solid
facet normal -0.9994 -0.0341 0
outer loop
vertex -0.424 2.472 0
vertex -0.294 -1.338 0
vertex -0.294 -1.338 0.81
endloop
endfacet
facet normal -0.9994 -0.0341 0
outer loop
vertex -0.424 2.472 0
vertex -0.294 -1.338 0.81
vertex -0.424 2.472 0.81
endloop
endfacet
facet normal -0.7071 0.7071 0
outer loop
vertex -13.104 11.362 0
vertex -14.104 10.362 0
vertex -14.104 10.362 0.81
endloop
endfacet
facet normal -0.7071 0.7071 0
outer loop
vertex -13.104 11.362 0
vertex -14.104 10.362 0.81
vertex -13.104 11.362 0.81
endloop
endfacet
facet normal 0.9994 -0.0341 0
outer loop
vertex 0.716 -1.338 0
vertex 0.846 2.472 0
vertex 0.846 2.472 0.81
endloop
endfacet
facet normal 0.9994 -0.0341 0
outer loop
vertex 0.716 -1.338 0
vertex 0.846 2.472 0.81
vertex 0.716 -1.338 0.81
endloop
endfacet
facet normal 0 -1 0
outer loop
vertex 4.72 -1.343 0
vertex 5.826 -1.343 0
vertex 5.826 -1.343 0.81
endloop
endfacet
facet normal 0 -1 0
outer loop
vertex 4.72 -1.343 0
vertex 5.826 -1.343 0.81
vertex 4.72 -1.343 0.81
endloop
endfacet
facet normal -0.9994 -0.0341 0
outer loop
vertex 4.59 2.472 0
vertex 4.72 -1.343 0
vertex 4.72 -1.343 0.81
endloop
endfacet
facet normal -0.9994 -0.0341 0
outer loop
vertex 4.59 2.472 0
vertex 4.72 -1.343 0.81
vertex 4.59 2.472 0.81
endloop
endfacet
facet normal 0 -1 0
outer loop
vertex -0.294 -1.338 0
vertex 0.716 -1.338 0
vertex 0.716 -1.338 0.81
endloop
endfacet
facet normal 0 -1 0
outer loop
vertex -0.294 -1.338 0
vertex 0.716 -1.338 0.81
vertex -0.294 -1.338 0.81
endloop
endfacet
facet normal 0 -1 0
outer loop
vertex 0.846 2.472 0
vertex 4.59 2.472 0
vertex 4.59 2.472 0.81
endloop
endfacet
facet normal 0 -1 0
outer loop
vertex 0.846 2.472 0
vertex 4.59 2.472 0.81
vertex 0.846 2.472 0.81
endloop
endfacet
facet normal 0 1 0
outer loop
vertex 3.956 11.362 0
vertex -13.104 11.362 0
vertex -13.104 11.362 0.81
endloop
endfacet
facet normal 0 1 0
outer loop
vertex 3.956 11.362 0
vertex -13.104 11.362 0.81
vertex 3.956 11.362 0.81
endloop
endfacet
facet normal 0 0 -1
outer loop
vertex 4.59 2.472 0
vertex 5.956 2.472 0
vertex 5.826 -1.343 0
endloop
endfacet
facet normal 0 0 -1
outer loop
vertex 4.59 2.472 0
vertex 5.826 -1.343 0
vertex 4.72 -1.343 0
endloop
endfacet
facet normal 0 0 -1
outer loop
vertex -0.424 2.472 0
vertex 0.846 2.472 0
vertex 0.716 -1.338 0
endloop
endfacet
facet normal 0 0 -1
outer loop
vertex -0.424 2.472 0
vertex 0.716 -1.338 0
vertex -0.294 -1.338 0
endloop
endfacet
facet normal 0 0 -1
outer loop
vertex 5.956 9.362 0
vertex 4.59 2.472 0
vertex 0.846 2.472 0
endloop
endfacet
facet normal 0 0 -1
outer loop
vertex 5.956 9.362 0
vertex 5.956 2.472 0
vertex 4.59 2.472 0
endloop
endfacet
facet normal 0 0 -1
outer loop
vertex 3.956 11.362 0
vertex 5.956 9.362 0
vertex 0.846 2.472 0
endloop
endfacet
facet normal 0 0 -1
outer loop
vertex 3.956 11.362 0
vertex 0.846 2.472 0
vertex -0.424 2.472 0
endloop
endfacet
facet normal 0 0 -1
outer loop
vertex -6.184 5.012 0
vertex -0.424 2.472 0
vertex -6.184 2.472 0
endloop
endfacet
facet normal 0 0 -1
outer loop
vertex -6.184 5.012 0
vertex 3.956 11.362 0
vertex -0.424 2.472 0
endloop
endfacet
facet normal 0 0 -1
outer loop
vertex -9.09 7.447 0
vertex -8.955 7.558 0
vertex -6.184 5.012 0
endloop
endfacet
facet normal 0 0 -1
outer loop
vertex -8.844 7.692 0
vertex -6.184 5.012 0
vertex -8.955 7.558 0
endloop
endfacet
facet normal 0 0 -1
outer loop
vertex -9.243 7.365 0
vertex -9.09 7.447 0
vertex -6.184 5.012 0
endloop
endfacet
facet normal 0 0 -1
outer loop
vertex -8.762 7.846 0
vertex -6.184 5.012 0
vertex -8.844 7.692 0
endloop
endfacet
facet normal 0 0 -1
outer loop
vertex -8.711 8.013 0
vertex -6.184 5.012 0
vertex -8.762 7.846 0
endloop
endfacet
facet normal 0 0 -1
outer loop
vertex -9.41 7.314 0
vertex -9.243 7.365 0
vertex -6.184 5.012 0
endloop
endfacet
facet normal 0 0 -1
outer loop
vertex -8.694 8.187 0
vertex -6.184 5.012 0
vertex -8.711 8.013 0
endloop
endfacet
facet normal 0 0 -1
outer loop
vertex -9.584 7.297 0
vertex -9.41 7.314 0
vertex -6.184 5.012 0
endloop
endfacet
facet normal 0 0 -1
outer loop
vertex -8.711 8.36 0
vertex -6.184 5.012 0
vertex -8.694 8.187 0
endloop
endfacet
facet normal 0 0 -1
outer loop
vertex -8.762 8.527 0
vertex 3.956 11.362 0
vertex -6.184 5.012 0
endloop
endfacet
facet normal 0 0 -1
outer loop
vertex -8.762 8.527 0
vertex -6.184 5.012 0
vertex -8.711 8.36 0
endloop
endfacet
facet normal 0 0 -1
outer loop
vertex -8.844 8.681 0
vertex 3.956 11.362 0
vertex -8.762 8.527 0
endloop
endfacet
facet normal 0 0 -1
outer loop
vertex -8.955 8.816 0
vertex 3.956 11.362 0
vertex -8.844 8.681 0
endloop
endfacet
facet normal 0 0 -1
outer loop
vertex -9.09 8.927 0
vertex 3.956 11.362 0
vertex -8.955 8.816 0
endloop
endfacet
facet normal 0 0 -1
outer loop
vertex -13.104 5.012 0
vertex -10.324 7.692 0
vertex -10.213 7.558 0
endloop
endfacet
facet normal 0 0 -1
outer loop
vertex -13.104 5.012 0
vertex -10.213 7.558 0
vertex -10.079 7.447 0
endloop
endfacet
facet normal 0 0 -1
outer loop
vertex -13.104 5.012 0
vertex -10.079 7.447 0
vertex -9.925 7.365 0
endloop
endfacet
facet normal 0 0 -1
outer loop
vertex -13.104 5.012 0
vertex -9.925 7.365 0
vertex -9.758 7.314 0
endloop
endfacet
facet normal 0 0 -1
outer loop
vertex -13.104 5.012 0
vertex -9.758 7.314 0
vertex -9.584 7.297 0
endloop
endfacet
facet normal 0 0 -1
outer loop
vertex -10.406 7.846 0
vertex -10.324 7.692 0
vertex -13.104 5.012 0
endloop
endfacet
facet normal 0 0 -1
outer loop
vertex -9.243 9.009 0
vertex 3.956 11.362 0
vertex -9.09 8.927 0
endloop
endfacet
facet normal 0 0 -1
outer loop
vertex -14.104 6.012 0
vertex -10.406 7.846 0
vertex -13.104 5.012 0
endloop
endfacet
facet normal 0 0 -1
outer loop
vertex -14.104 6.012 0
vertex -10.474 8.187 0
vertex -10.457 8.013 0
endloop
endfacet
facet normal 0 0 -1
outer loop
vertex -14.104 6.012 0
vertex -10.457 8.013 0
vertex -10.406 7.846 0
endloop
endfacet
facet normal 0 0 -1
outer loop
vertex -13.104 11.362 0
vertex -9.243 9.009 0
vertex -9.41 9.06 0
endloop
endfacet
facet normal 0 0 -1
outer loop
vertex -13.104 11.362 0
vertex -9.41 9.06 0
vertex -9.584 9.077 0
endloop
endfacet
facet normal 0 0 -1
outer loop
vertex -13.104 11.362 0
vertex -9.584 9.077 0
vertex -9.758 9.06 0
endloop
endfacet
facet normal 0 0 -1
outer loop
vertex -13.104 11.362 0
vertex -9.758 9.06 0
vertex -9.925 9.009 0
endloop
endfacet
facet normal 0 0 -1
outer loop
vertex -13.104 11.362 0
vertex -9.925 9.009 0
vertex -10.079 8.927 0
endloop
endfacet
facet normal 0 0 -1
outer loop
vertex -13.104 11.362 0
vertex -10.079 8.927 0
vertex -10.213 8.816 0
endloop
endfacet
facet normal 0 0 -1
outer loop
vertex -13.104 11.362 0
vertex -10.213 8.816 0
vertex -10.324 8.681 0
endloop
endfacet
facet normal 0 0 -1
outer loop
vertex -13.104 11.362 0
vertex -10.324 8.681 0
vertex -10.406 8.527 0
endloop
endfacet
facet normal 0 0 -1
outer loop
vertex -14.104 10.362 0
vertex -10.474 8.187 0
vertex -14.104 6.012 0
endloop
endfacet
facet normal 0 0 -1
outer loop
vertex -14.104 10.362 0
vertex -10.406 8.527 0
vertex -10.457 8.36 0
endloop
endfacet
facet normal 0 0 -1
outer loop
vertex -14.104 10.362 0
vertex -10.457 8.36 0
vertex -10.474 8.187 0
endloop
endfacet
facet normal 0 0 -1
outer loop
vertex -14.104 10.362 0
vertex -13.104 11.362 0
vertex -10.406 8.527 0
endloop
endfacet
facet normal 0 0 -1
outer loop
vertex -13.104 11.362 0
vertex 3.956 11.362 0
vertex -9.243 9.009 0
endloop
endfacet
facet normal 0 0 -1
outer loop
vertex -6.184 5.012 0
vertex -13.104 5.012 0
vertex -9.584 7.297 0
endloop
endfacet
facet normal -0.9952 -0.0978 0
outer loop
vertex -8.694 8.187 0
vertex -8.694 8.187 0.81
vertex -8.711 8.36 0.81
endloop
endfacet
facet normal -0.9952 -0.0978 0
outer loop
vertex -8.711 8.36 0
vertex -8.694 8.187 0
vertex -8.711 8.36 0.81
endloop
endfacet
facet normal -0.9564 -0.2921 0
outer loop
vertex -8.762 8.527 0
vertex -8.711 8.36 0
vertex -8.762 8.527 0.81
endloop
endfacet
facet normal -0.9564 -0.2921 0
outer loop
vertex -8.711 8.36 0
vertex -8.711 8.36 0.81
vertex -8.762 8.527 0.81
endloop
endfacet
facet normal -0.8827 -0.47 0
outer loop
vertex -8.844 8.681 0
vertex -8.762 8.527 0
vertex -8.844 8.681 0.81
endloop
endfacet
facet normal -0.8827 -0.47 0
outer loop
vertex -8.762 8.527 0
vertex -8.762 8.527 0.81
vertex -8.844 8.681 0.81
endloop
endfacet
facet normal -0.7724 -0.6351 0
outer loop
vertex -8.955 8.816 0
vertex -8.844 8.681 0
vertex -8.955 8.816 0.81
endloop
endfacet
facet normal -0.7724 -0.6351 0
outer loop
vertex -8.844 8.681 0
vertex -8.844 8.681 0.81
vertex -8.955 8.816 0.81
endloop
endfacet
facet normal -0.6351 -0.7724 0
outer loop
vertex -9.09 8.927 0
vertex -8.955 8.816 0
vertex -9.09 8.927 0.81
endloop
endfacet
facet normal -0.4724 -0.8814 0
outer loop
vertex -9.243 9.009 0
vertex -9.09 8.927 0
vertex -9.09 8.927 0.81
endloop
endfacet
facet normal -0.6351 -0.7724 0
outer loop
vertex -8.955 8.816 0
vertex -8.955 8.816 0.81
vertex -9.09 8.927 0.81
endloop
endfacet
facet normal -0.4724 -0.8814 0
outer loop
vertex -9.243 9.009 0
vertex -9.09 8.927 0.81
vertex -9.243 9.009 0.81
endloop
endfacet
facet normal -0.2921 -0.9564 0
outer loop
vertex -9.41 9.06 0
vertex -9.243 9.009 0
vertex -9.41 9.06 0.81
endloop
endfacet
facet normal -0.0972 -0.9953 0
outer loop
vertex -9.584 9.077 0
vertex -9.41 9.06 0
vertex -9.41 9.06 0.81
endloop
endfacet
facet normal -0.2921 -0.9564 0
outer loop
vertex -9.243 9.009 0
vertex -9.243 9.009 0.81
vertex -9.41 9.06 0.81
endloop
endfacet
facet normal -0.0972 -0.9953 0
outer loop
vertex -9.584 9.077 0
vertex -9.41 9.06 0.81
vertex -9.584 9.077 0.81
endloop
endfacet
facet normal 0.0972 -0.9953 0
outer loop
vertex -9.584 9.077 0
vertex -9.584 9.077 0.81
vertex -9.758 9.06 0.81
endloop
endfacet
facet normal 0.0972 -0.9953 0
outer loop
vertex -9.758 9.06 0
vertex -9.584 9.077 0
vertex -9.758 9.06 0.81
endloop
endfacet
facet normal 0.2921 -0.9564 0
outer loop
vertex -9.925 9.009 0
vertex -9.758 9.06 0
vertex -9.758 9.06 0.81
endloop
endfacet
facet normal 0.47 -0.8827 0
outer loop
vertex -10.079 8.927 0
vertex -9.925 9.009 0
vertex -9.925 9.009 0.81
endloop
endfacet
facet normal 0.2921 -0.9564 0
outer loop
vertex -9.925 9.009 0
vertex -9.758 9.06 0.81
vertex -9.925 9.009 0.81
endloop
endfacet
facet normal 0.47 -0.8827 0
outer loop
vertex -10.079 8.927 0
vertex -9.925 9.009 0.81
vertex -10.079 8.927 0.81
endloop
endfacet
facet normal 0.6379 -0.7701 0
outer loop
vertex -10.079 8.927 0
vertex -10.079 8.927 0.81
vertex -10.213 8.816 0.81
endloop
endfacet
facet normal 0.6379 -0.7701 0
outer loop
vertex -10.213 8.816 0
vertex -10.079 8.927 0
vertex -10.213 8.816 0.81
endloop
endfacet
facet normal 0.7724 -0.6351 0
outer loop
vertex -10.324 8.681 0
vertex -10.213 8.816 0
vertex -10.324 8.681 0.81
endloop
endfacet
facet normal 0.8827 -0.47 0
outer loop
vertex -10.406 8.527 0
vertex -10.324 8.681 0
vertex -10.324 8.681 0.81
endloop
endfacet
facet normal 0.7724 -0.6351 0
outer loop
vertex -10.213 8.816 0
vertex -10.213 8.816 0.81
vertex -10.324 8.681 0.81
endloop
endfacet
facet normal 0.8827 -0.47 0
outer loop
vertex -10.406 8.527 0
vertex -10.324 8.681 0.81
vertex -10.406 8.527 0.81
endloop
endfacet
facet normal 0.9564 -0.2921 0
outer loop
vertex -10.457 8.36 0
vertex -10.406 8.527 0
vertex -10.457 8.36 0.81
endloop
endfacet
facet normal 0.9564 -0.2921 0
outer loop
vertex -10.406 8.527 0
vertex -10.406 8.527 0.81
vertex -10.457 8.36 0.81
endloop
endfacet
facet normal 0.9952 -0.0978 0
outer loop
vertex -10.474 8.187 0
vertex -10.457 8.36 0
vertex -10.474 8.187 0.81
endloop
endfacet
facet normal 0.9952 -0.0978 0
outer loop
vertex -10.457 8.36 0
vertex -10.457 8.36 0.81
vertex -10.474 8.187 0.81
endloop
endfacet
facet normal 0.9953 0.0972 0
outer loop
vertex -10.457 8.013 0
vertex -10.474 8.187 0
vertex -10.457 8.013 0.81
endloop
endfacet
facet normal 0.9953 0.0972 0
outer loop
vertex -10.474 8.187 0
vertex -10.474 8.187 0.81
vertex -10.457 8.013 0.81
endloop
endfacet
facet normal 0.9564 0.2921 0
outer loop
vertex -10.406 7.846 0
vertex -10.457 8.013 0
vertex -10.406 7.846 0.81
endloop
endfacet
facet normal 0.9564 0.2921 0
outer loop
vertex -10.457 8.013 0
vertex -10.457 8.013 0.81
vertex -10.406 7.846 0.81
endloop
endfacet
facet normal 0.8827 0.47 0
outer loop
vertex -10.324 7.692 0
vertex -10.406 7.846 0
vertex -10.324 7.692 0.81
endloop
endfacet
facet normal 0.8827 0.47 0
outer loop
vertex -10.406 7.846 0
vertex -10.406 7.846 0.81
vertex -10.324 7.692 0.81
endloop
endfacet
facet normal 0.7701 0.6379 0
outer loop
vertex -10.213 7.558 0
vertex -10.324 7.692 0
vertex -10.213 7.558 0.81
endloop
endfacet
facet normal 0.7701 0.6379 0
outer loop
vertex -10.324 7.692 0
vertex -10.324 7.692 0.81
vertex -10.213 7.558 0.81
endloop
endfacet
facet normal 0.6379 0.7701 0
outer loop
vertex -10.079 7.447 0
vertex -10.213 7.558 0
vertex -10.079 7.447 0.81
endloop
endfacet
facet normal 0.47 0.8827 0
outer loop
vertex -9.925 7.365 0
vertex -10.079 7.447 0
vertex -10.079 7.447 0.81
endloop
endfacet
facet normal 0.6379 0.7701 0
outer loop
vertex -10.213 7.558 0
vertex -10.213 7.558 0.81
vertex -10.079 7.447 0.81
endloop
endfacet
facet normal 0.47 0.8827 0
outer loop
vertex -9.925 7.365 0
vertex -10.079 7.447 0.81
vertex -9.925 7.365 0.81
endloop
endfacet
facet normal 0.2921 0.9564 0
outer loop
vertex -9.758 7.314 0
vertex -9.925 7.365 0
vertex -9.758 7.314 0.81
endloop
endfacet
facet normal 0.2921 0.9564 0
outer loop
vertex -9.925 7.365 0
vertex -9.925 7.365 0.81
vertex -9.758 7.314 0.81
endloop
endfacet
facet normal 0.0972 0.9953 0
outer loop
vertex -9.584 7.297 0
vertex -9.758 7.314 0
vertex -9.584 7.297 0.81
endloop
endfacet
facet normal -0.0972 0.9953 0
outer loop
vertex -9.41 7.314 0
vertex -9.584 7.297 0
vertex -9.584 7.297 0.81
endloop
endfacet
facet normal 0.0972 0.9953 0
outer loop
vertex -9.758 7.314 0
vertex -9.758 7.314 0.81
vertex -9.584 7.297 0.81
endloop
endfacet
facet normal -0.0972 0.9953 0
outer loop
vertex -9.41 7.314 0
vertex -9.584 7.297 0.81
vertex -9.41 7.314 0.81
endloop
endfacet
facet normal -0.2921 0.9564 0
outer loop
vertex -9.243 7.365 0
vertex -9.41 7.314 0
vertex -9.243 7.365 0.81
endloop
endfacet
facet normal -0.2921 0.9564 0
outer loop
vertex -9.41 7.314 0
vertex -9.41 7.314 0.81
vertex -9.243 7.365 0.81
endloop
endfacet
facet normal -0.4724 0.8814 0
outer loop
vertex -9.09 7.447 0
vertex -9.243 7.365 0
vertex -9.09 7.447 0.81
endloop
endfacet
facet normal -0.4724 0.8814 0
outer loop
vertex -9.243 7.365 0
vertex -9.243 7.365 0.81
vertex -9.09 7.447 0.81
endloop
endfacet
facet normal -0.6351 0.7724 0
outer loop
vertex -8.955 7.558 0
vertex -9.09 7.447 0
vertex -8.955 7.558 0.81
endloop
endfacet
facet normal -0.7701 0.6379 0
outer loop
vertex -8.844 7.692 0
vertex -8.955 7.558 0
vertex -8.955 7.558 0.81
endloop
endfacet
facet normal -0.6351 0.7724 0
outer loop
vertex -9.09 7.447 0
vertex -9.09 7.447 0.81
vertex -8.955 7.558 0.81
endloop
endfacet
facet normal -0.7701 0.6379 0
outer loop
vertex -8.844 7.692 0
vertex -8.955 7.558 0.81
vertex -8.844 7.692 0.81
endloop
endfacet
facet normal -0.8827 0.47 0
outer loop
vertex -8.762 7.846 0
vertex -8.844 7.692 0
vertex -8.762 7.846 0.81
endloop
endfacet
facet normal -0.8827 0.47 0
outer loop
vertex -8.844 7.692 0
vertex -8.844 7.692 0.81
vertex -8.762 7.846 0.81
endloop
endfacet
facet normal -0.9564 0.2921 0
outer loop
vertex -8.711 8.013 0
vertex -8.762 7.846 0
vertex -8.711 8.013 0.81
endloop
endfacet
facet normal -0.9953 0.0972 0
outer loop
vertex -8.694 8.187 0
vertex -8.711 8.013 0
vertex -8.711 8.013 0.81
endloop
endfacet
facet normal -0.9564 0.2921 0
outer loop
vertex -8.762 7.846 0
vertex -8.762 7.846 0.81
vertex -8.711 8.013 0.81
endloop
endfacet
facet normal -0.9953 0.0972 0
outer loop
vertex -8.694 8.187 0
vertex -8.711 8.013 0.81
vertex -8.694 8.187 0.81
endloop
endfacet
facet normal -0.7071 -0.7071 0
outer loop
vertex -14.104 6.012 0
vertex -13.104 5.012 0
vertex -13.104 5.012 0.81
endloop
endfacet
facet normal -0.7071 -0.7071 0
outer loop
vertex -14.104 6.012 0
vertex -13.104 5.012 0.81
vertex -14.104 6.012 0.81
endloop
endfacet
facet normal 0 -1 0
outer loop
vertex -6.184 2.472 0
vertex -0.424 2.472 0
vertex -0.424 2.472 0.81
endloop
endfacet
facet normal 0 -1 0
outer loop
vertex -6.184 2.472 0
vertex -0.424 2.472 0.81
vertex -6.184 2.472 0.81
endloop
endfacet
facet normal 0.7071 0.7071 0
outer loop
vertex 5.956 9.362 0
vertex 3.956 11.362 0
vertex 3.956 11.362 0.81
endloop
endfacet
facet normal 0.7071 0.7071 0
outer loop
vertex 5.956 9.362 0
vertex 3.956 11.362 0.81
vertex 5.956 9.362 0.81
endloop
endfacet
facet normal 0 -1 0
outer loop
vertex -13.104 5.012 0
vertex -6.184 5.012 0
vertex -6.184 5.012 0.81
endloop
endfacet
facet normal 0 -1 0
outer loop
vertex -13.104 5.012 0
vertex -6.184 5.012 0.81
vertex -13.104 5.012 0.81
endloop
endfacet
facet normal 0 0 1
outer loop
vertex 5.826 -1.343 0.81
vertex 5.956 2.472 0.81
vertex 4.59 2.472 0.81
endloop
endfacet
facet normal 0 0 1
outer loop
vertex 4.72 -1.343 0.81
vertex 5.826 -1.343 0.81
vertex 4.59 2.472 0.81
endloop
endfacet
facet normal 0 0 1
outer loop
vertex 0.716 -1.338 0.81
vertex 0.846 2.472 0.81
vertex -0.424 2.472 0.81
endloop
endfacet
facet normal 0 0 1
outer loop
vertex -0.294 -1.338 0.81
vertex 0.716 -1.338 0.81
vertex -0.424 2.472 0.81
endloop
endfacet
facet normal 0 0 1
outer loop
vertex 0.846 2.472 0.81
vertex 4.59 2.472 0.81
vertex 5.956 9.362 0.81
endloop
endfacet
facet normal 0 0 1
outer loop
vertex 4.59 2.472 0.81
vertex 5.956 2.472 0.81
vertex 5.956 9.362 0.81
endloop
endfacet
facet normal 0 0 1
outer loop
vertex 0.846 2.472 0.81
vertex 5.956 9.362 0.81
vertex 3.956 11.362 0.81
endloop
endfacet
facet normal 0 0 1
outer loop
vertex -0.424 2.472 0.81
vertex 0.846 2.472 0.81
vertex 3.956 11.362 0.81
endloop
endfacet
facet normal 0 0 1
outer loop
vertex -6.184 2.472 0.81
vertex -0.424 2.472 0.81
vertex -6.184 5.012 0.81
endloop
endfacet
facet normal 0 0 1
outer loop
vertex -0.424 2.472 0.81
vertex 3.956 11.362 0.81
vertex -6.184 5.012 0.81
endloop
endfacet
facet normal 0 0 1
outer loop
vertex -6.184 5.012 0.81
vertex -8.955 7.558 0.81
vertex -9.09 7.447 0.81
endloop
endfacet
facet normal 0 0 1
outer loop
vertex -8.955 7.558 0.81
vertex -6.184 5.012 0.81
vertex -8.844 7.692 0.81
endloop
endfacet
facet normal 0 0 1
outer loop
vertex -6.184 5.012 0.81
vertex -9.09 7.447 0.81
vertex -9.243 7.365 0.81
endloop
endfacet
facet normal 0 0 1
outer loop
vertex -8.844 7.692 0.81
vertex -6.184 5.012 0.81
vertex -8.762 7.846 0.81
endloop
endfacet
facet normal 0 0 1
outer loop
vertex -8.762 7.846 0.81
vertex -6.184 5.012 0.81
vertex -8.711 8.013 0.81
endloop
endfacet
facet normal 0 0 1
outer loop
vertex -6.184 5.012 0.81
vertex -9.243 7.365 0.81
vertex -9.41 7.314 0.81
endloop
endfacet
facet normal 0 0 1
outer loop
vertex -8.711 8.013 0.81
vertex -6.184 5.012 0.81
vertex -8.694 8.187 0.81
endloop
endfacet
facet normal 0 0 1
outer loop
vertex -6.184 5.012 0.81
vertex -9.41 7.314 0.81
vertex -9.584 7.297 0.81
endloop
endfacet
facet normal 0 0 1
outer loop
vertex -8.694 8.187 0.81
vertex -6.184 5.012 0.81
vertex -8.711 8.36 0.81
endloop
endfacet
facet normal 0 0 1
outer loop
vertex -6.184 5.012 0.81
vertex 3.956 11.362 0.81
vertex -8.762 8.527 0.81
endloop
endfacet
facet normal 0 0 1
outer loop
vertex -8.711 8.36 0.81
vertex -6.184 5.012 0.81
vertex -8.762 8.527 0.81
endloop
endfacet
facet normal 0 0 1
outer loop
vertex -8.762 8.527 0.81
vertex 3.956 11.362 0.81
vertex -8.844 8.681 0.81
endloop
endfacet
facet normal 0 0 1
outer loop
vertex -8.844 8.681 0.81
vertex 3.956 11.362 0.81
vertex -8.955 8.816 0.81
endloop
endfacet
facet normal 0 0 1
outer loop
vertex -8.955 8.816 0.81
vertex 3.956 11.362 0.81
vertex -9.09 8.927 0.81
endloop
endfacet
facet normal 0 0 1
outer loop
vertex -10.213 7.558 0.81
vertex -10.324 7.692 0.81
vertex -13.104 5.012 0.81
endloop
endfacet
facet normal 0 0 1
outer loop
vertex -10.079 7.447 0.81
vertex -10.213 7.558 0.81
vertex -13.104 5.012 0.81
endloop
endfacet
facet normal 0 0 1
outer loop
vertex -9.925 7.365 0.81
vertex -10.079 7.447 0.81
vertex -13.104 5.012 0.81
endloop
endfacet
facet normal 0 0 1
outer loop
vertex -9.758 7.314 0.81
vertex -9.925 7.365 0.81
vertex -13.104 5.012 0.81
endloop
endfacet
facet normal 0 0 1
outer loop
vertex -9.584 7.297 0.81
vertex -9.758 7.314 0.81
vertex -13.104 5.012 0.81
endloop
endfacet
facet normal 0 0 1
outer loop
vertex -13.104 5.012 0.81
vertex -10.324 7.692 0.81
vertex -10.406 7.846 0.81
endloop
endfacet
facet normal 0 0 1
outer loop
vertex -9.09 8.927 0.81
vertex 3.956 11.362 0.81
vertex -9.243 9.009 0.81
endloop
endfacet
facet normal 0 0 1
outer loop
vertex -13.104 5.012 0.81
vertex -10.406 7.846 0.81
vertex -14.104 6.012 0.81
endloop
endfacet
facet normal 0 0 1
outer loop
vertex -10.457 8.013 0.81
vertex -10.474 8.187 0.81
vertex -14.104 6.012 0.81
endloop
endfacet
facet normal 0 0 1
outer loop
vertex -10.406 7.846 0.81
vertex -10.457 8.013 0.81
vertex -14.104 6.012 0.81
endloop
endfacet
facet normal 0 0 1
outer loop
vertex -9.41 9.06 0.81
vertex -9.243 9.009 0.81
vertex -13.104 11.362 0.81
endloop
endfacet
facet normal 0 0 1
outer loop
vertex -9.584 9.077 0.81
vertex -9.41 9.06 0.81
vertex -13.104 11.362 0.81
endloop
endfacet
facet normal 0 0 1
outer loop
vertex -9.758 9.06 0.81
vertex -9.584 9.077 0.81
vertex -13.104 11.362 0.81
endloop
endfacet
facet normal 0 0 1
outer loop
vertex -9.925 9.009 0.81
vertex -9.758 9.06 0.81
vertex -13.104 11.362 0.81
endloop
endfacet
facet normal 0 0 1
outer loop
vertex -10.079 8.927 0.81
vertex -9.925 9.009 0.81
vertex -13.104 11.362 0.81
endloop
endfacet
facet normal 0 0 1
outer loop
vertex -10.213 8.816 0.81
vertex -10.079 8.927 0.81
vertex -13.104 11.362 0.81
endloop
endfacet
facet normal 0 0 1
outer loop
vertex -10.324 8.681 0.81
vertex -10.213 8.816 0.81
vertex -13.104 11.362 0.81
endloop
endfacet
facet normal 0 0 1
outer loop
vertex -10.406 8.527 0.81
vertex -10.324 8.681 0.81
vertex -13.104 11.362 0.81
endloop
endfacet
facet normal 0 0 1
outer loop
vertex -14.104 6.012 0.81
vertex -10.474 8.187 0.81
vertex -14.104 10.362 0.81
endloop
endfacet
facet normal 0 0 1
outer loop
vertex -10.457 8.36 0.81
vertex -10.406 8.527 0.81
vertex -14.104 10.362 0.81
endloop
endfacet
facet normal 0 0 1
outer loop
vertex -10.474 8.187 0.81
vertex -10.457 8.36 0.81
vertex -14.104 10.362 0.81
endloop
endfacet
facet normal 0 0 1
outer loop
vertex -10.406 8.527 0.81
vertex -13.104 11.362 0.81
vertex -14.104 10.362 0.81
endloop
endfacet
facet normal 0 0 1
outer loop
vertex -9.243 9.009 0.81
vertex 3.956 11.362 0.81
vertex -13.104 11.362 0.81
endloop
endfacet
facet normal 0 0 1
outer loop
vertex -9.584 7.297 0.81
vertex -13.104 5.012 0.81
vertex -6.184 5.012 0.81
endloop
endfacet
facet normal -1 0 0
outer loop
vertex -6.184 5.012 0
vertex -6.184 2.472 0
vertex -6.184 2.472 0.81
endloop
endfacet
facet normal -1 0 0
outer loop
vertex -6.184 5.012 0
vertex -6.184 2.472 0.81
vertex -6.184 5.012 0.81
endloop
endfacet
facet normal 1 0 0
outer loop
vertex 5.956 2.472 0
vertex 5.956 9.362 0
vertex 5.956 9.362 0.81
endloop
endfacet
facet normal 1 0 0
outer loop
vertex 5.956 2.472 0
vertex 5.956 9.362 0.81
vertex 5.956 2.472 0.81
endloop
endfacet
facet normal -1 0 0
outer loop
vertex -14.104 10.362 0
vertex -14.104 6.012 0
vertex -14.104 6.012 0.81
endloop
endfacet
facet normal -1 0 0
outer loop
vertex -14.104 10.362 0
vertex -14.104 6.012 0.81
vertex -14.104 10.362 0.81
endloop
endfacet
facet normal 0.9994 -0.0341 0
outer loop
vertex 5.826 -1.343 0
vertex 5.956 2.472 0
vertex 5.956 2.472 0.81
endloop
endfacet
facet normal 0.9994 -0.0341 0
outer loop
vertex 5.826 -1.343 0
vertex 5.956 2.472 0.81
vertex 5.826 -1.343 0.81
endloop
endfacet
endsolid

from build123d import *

# Parameters (mm, degrees)
EXTRUSION1_DEPTH        = 0.81
ESQUISSE2_R             = 0.89
ENL_V_MAT_EXTRU_1_DEPTH = 0.81


with BuildPart() as part:
    # Esquisse1 → Extrusion1 (new body)
    with BuildSketch(Plane.XY):
        Polygon((-13.10407394, 11.361851996), (3.95592606, 11.361851996), (5.95592606, 9.361851996), (5.95592606, 2.471851996), (5.826054609, -1.342616085), (4.720113353, -1.342616085), (4.590241902, 2.471851996), (0.846236894, 2.471851996), (0.716236894, -1.338148004), (-0.293763106, -1.338148004), (-0.423763106, 2.471851996), (-6.18407394, 2.471851996), (-6.18407394, 5.011851996), (-13.10407394, 5.011851996), (-14.10407394, 6.011851996), (-14.10407394, 10.361851996), align=None)
    extrude(amount=EXTRUSION1_DEPTH)

    # Esquisse2 → Enlèv. mat.-Extru.1 (cut)
    with BuildSketch(Plane.XY.offset(0.81)):
        with Locations((-9.58407394, 8.186851996)):
            Circle(ESQUISSE2_R)
    extrude(amount=-ENL_V_MAT_EXTRU_1_DEPTH, mode=Mode.SUBTRACT)


solid = part.part
